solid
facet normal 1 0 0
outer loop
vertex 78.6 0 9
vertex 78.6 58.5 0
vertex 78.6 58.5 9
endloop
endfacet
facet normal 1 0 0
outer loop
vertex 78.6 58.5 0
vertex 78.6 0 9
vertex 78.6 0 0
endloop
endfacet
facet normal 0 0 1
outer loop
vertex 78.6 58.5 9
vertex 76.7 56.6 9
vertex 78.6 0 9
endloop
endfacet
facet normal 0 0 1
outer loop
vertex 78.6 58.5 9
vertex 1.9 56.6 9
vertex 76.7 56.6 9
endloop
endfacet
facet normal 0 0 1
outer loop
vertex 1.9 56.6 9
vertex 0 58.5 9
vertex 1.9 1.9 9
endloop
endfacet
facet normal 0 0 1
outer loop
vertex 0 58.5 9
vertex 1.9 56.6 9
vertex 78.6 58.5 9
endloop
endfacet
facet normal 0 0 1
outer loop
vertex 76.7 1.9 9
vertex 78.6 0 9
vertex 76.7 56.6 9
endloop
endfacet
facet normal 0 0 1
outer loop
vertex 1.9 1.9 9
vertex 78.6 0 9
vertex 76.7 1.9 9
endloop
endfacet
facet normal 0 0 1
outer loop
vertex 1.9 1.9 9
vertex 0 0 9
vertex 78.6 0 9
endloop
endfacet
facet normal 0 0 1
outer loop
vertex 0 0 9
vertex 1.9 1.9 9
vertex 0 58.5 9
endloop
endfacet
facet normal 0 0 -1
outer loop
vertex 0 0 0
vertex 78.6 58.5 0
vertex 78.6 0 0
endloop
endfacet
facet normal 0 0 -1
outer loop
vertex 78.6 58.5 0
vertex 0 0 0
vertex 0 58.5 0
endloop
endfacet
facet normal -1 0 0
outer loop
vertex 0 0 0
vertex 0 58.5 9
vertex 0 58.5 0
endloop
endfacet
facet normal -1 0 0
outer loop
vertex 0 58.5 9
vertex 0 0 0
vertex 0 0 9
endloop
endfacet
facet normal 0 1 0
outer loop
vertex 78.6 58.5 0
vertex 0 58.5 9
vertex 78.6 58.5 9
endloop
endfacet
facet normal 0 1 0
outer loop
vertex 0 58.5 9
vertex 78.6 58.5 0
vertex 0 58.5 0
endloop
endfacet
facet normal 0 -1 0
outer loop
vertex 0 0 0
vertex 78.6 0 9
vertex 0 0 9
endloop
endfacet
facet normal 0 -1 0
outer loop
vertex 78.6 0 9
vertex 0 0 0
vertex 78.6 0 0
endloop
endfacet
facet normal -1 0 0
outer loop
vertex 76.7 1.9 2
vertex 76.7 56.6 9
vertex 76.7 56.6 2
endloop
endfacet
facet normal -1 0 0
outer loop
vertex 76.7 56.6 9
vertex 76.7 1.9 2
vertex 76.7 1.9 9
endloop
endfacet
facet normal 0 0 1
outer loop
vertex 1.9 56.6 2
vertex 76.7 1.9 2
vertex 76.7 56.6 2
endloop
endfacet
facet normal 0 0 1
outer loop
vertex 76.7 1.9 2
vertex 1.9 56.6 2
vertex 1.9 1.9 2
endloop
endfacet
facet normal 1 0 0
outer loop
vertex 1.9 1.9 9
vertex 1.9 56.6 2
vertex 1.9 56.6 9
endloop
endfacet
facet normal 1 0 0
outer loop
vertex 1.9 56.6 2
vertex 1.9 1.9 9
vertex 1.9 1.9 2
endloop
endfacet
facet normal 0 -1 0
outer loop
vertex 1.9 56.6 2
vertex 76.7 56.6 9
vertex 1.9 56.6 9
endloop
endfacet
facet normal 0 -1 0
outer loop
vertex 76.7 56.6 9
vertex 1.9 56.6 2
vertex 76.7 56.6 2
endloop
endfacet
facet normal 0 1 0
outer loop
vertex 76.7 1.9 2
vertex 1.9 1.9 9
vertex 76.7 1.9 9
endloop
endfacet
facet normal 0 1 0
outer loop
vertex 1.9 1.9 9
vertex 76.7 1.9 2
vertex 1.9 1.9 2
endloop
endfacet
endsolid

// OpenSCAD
caseInnerWidth = 70.6;
caseInnerLength = 50.5;
caseThickness = 2;
caseHeight = 27;
showCase = false;
showLid = true;

if (showLid) {
	difference() {
		color("white") cube([caseInnerWidth + (4 * caseThickness), caseInnerLength + (4 * caseThickness), caseThickness + 7]);
		
		translate([caseThickness - 0.1, caseThickness - 0.1, caseThickness])
		color("blue") cube([caseInnerWidth + (2 * caseThickness) + 0.2, caseInnerLength + (2 * caseThickness) + 0.2, caseThickness + 7.1]);

	}
}

if (showCase) {
	difference() {
		cube([caseInnerWidth + (2 * caseThickness), caseInnerLength + (2 * caseThickness), caseHeight + (2 * caseThickness)]);
		
		translate([caseThickness, caseThickness, caseThickness]) cube([caseInnerWidth, caseInnerLength, caseHeight + caseThickness + .01]);

		// hole in side of case for USB to feather board
		translate([(caseInnerWidth) + caseThickness - 4, (caseInnerLength / 2) - (caseThickness * 2), caseThickness]) color("SlateBlue") cube([8, 12, 8]);

		// cutout for sensor
		translate([caseInnerWidth/2 - (26.1 / 2) + caseThickness - 3.5, caseInnerLength + caseThickness + 4.8, caseThickness]) rotate([90, 0, 0]) distSensorBB(renderBoard = false);
	}

	// mounts for feather board
	translate([(caseInnerWidth) + caseThickness - (50.9), (caseInnerLength/2) + caseThickness - (20/2)]) featherBoard();

	// screw mounts for lid
	color("DeepPink") lidMount();

	// add in mounts for sensor	
	translate([caseInnerWidth/2 - (26.1 / 2) + caseThickness, caseInnerLength + caseThickness + 4.8, caseThickness]) rotate([90, 0, 0]) distSensorBB(renderBoard = false, renderSensorCutoutBox = false);
}

module lidMount() {
	mountRadius = 2.54;
	holeRadius = 0.65;
	// origin
	translate([caseThickness - (mountRadius/2), caseThickness - (mountRadius/2), (caseHeight - 1 - caseThickness)]) screwMount(screwMountRadius = mountRadius, screwHoleRadius = holeRadius, screwMountHeight = 5);

	// bottom right
	translate([- (mountRadius/2) + caseInnerWidth, caseThickness - (mountRadius/2), (caseHeight - 1 - caseThickness)]) screwMount(screwMountRadius = mountRadius, screwHoleRadius = holeRadius, screwMountHeight = 5);

	// origin
	translate([caseThickness - (mountRadius/2), - (mountRadius/2) + caseInnerLength, (caseHeight - 1 - caseThickness)]) screwMount(screwMountRadius = mountRadius, screwHoleRadius = holeRadius, screwMountHeight = 5);

	// origin
	translate([- (mountRadius/2) + caseInnerWidth, - (mountRadius/2) + caseInnerLength, (caseHeight - 1 - caseThickness)]) screwMount(screwMountRadius = mountRadius, screwHoleRadius = holeRadius, screwMountHeight = 5);
}

module featherBoard(boardThickness = 2, screwMountHeight = 2.5) {
	shortSide = 22.9;
	longSide = 50.9;
	screwMountRadius = 2.54;
	screwHoleRadius = 0.65;
	//screwMountHeight = 2.5;
	//boardThickness = 2;

	color("black") cube([longSide, shortSide, boardThickness]);

	// closest to origin corner.
	// bottom left
	translate([(screwMountRadius * 0.5)  -1.15, (screwMountRadius * .5) - 2.20, 0]) screwMount(screwMountRadius = screwMountRadius, screwHoleRadius = screwHoleRadius, screwMountHeight = 2.5 + 2);
		// top left
	color("blue") translate([(screwMountRadius * .5) -1.15, shortSide - (screwMountRadius * 2.5), 0]) screwMount(screwMountRadius = screwMountRadius, screwHoleRadius = screwHoleRadius, screwMountHeight = 2.5 + 2);

	// top right
	translate([longSide - (screwMountRadius * 2.5), shortSide - (screwMountRadius * 2.5), 0]) screwMount(screwMountRadius = screwMountRadius, screwHoleRadius = screwHoleRadius, screwMountHeight = 2.5 + 2);

	// bottom right
	translate([longSide - (screwMountRadius * 2.5), (screwMountRadius * .5) - 2.20, 0]) screwMount(screwMountRadius = screwMountRadius, screwHoleRadius = screwHoleRadius, screwMountHeight = 2.5 + 2);
}

module screwMount(screwMountRadius = 1.7, screwMountHeight = 2.5, screwHoleRadius = 0.5) {
	difference() {
		color("white") translate([screwMountRadius, screwMountRadius, 0]) cylinder(r=screwMountRadius, h=(screwMountHeight), $fn=100);
		color("green") translate([screwMountRadius, screwMountRadius, 0]) cylinder(r=screwHoleRadius, h=(screwMountHeight) + 0.2, $fn=100);
	}
}

/* 
	the VL53 lidar.
	Thickness includes the qwiic connector mount heights.
*/
module distSensorBB(boardX = 26.1, boardY = 26.1, boardThickness = 4.8, renderBoard = true, renderSensorCutoutBox = true) {
	mountRadius = 2.54;
	mountHeight = 3.6;

	if (renderBoard) {
		color("LightSteelBlue") cube([boardX, boardY, boardThickness]);
	}

	if (renderSensorCutoutBox) {
		translate([boardX/2, boardY/2 - 2, 0]) cube([7, 6, 8]);
	}

	//translate([0, 0, boardThickness]) screwMount(screwMountRadius = 2.54);
	//translate([boardX - (2.54 * 2), 0, boardThickness]) screwMount(screwMountRadius = 2.54);
	translate([boardX - (mountRadius * 2), boardY - (mountRadius * 2), boardThickness]) screwMount(screwMountRadius = mountRadius, screwMountHeight = mountHeight);
	translate([0, boardY - (mountRadius * 2), boardThickness]) screwMount(screwMountRadius = mountRadius, screwMountHeight = mountHeight);
}
